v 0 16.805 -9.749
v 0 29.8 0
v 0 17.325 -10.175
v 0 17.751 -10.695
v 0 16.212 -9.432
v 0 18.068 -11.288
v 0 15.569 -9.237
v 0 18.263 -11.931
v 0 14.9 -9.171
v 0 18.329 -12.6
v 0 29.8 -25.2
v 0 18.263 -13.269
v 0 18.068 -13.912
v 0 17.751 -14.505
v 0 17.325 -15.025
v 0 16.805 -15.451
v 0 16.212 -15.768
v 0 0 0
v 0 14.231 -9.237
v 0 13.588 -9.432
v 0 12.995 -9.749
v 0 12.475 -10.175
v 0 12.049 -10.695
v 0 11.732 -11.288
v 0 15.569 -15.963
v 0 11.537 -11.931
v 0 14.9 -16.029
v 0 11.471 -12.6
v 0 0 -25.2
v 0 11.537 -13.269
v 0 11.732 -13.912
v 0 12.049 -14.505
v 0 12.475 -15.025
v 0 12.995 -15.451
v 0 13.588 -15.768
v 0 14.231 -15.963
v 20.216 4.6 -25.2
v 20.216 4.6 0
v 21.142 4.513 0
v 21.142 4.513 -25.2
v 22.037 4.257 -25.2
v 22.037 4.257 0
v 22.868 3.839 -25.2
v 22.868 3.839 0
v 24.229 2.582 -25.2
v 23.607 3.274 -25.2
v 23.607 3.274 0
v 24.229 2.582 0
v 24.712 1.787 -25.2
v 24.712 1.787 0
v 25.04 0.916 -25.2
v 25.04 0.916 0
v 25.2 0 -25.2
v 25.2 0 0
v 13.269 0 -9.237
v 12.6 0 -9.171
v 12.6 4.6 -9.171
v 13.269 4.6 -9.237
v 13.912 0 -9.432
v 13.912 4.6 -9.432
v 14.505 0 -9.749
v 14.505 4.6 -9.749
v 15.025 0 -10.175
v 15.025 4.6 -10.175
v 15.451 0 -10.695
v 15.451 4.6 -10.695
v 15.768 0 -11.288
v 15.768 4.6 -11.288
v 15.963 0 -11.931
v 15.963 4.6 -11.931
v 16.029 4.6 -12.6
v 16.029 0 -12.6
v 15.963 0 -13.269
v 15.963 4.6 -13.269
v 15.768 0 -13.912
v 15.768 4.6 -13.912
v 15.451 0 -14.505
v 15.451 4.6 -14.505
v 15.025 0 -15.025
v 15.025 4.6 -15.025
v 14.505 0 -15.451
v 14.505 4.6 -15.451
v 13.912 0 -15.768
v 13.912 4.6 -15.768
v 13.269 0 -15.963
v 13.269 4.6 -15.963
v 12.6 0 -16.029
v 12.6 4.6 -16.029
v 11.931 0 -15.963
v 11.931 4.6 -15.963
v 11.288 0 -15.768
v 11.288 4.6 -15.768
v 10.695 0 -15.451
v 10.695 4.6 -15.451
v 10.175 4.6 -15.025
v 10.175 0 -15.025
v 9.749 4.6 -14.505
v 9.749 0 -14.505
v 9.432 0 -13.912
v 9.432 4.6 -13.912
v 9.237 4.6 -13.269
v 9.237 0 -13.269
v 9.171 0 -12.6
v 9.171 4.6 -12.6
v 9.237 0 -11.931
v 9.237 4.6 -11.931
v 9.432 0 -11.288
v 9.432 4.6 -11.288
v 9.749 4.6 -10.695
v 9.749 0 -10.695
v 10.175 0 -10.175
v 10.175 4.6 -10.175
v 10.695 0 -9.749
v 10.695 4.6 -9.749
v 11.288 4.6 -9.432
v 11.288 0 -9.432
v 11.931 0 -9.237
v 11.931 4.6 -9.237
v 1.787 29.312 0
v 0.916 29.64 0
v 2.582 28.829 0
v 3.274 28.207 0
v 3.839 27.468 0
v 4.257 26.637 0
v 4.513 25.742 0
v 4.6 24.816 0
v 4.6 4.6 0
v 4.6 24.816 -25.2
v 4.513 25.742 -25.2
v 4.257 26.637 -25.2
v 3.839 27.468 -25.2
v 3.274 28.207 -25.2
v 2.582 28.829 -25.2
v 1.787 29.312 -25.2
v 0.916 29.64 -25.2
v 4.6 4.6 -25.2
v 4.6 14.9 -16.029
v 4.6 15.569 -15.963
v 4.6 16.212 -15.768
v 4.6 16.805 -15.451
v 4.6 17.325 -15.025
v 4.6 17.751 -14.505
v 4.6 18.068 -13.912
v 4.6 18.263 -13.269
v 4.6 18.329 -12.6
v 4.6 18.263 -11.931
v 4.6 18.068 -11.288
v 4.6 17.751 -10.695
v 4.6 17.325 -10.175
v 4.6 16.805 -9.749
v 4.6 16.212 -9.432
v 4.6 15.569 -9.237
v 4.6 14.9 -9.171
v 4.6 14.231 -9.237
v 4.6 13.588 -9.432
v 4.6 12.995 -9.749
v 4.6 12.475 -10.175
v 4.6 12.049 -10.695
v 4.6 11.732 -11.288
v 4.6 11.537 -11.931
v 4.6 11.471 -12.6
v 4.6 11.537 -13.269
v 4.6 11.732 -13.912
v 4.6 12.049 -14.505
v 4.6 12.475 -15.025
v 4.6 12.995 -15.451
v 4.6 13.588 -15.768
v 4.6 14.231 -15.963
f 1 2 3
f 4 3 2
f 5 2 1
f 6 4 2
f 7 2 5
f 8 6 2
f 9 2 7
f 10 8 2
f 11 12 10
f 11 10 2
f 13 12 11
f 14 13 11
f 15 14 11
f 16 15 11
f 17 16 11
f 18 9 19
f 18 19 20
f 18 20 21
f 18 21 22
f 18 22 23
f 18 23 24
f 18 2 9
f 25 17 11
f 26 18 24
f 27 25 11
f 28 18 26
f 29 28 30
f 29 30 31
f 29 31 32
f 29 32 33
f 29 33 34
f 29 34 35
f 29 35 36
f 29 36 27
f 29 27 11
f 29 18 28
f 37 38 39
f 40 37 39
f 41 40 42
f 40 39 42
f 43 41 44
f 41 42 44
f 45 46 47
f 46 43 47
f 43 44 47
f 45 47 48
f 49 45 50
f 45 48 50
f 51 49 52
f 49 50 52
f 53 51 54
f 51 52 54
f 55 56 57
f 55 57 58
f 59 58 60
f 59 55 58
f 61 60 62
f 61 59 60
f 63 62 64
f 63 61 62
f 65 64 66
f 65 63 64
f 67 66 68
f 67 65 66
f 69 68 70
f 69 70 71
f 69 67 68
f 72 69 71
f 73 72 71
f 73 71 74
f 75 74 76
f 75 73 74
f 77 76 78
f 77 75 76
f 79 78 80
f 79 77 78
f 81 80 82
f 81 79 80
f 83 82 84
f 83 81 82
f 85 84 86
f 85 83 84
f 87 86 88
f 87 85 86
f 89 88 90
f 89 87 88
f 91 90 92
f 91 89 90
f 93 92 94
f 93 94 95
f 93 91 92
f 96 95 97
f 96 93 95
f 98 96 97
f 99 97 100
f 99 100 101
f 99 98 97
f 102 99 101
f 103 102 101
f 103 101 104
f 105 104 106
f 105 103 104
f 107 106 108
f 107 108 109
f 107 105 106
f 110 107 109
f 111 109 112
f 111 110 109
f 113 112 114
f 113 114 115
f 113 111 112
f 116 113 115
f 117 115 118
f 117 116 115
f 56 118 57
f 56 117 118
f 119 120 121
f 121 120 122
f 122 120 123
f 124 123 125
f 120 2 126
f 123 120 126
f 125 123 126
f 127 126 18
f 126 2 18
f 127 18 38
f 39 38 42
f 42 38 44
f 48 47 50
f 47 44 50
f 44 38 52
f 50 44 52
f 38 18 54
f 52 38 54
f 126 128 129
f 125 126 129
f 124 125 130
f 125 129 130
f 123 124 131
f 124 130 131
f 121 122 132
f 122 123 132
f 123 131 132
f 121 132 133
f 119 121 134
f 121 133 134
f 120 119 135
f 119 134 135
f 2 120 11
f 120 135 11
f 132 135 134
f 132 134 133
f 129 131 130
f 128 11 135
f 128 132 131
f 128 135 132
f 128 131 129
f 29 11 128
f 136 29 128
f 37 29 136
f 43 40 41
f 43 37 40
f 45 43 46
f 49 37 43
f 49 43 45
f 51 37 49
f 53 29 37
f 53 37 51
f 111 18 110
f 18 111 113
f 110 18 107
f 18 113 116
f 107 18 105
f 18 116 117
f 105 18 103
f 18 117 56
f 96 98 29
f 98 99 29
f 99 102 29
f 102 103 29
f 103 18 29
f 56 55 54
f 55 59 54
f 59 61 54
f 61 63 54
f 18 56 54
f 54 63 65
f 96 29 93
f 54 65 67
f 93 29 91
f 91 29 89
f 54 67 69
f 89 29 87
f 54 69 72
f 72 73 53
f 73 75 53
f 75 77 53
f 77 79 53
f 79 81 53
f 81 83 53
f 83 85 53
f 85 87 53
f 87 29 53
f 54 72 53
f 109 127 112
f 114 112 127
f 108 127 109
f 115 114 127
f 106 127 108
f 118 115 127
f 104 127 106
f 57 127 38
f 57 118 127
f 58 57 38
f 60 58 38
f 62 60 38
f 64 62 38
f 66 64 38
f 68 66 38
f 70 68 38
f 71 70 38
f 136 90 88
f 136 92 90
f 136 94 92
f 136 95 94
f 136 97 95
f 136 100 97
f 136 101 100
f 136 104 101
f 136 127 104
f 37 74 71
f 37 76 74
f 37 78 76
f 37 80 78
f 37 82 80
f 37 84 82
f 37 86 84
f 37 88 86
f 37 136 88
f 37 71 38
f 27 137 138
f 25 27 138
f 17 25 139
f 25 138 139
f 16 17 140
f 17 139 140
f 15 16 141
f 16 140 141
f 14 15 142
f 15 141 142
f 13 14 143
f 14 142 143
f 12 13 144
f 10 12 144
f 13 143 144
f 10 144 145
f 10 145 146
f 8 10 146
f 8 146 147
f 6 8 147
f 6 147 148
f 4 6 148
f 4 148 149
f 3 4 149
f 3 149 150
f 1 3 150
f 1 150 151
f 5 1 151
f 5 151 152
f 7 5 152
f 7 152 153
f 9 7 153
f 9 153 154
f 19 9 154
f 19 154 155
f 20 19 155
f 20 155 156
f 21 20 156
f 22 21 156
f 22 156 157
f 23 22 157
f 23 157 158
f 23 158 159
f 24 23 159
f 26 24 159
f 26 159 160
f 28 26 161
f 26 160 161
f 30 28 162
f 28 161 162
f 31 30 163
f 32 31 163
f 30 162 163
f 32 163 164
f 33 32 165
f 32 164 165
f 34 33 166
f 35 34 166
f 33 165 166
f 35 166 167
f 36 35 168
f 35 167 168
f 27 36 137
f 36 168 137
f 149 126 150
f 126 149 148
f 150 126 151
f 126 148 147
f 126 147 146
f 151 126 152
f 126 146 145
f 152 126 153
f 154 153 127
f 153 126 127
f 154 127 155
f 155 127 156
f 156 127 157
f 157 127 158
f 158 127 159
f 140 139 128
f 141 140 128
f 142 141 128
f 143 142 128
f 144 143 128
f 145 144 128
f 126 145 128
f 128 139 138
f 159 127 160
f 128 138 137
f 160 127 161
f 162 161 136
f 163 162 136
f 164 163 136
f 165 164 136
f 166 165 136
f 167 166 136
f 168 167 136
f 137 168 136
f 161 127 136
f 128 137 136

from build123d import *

# Parameters (mm, degrees)
SKETCH1_W           = 25.2
SKETCH1_H           = 25.2
SKETCH1_R           = 3.429
BOSS_EXTRUDE1_DEPTH = 4.6
SKETCH2_W           = 4.6
SKETCH2_H           = 25.2
BOSS_EXTRUDE2_DEPTH = 25.2
CUT_EXTRUDE1_REACH  = 46.13
SKETCH3_R           = 3.429
FILLET1_R           = 5


with BuildPart() as part:
    # Sketch1 → Boss-Extrude1 (new body)
    with BuildSketch(Plane(origin=(0, 0, 0), x_dir=(1, 0, 0), z_dir=(0, 1, 0))):
        with Locations((12.6, 12.6)):
            Rectangle(SKETCH1_W, SKETCH1_H)
        with Locations(Location((12.6, 12.6, 0), (0, 0, 270))):
            Circle(SKETCH1_R, mode=Mode.SUBTRACT)
    extrude(amount=BOSS_EXTRUDE1_DEPTH)

    # Sketch2 → Boss-Extrude2 (add)
    with BuildSketch(Plane(origin=(0, 4.6, 0), x_dir=(1, 0, 0), z_dir=(0, 1, 0))):
        with Locations((2.3, 12.6)):
            Rectangle(SKETCH2_W, SKETCH2_H)
    extrude(amount=BOSS_EXTRUDE2_DEPTH)

    # Sketch3 → Cut-Extrude1 (cut, up to next)
    with BuildSketch(Plane(origin=(4.6, 0, 0), x_dir=(0, 0, -1), z_dir=(1, 0, 0)), mode=Mode.PRIVATE) as cut_extrude1_sk1:
        with Locations((12.6, 14.9)):
            Circle(SKETCH3_R)
    cut_extrude1_tool1 = extrude(cut_extrude1_sk1.sketch, amount=-CUT_EXTRUDE1_REACH, mode=Mode.PRIVATE) & part.part
    add(cut_extrude1_tool1.solids().sort_by_distance((4.6, 14.9, -12.6))[0], mode=Mode.SUBTRACT)

    # Fillet1
    # the kernel refuses this fillet: 5 mm, written as the material it takes off along each edge
    with BuildSketch(Plane(origin=(4.6, 29.8, -37.659935794), x_dir=(-1, 0, 0), z_dir=(0, 0, 1))) as fillet1_piece_1:
        with BuildLine():
            CenterArc((5, 4.983974318), FILLET1_R, 180, 85.411434264)
            Line((0, 4.983974318), (-0.1, 4.983974318))
            Line((-0.1, 4.983974318), (-0.1, 0))
            Line((-0.1, 0), (0, -0.1))
            ThreePointArc((0, -0.1), (2.3, -0.1), (4.592, -0.099679486))
            Line((4.592, -0.099679486), (4.6, 0))
        make_face()
    extrude(amount=50.119871589, mode=Mode.SUBTRACT)
    with BuildSketch(Plane(origin=(25.2, 4.6, 12.459935794), x_dir=(-1, 0, 0), z_dir=(0, 0, -1))) as fillet1_piece_2:
        with BuildLine():
            CenterArc((4.983974318, -5), FILLET1_R, 90, 85.411434264)
            Line((0, -4.6), (-0.099679486, -4.592))
            ThreePointArc((-0.099679486, -4.592), (-0.1, -2.3), (-0.1, 0))
            Line((-0.1, 0), (0, 0.1))
            Line((0, 0.1), (4.983974318, 0.1))
            Line((4.983974318, 0.1), (4.983974318, 0))
        make_face()
    extrude(amount=50.119871589, mode=Mode.SUBTRACT)


solid = part.part
